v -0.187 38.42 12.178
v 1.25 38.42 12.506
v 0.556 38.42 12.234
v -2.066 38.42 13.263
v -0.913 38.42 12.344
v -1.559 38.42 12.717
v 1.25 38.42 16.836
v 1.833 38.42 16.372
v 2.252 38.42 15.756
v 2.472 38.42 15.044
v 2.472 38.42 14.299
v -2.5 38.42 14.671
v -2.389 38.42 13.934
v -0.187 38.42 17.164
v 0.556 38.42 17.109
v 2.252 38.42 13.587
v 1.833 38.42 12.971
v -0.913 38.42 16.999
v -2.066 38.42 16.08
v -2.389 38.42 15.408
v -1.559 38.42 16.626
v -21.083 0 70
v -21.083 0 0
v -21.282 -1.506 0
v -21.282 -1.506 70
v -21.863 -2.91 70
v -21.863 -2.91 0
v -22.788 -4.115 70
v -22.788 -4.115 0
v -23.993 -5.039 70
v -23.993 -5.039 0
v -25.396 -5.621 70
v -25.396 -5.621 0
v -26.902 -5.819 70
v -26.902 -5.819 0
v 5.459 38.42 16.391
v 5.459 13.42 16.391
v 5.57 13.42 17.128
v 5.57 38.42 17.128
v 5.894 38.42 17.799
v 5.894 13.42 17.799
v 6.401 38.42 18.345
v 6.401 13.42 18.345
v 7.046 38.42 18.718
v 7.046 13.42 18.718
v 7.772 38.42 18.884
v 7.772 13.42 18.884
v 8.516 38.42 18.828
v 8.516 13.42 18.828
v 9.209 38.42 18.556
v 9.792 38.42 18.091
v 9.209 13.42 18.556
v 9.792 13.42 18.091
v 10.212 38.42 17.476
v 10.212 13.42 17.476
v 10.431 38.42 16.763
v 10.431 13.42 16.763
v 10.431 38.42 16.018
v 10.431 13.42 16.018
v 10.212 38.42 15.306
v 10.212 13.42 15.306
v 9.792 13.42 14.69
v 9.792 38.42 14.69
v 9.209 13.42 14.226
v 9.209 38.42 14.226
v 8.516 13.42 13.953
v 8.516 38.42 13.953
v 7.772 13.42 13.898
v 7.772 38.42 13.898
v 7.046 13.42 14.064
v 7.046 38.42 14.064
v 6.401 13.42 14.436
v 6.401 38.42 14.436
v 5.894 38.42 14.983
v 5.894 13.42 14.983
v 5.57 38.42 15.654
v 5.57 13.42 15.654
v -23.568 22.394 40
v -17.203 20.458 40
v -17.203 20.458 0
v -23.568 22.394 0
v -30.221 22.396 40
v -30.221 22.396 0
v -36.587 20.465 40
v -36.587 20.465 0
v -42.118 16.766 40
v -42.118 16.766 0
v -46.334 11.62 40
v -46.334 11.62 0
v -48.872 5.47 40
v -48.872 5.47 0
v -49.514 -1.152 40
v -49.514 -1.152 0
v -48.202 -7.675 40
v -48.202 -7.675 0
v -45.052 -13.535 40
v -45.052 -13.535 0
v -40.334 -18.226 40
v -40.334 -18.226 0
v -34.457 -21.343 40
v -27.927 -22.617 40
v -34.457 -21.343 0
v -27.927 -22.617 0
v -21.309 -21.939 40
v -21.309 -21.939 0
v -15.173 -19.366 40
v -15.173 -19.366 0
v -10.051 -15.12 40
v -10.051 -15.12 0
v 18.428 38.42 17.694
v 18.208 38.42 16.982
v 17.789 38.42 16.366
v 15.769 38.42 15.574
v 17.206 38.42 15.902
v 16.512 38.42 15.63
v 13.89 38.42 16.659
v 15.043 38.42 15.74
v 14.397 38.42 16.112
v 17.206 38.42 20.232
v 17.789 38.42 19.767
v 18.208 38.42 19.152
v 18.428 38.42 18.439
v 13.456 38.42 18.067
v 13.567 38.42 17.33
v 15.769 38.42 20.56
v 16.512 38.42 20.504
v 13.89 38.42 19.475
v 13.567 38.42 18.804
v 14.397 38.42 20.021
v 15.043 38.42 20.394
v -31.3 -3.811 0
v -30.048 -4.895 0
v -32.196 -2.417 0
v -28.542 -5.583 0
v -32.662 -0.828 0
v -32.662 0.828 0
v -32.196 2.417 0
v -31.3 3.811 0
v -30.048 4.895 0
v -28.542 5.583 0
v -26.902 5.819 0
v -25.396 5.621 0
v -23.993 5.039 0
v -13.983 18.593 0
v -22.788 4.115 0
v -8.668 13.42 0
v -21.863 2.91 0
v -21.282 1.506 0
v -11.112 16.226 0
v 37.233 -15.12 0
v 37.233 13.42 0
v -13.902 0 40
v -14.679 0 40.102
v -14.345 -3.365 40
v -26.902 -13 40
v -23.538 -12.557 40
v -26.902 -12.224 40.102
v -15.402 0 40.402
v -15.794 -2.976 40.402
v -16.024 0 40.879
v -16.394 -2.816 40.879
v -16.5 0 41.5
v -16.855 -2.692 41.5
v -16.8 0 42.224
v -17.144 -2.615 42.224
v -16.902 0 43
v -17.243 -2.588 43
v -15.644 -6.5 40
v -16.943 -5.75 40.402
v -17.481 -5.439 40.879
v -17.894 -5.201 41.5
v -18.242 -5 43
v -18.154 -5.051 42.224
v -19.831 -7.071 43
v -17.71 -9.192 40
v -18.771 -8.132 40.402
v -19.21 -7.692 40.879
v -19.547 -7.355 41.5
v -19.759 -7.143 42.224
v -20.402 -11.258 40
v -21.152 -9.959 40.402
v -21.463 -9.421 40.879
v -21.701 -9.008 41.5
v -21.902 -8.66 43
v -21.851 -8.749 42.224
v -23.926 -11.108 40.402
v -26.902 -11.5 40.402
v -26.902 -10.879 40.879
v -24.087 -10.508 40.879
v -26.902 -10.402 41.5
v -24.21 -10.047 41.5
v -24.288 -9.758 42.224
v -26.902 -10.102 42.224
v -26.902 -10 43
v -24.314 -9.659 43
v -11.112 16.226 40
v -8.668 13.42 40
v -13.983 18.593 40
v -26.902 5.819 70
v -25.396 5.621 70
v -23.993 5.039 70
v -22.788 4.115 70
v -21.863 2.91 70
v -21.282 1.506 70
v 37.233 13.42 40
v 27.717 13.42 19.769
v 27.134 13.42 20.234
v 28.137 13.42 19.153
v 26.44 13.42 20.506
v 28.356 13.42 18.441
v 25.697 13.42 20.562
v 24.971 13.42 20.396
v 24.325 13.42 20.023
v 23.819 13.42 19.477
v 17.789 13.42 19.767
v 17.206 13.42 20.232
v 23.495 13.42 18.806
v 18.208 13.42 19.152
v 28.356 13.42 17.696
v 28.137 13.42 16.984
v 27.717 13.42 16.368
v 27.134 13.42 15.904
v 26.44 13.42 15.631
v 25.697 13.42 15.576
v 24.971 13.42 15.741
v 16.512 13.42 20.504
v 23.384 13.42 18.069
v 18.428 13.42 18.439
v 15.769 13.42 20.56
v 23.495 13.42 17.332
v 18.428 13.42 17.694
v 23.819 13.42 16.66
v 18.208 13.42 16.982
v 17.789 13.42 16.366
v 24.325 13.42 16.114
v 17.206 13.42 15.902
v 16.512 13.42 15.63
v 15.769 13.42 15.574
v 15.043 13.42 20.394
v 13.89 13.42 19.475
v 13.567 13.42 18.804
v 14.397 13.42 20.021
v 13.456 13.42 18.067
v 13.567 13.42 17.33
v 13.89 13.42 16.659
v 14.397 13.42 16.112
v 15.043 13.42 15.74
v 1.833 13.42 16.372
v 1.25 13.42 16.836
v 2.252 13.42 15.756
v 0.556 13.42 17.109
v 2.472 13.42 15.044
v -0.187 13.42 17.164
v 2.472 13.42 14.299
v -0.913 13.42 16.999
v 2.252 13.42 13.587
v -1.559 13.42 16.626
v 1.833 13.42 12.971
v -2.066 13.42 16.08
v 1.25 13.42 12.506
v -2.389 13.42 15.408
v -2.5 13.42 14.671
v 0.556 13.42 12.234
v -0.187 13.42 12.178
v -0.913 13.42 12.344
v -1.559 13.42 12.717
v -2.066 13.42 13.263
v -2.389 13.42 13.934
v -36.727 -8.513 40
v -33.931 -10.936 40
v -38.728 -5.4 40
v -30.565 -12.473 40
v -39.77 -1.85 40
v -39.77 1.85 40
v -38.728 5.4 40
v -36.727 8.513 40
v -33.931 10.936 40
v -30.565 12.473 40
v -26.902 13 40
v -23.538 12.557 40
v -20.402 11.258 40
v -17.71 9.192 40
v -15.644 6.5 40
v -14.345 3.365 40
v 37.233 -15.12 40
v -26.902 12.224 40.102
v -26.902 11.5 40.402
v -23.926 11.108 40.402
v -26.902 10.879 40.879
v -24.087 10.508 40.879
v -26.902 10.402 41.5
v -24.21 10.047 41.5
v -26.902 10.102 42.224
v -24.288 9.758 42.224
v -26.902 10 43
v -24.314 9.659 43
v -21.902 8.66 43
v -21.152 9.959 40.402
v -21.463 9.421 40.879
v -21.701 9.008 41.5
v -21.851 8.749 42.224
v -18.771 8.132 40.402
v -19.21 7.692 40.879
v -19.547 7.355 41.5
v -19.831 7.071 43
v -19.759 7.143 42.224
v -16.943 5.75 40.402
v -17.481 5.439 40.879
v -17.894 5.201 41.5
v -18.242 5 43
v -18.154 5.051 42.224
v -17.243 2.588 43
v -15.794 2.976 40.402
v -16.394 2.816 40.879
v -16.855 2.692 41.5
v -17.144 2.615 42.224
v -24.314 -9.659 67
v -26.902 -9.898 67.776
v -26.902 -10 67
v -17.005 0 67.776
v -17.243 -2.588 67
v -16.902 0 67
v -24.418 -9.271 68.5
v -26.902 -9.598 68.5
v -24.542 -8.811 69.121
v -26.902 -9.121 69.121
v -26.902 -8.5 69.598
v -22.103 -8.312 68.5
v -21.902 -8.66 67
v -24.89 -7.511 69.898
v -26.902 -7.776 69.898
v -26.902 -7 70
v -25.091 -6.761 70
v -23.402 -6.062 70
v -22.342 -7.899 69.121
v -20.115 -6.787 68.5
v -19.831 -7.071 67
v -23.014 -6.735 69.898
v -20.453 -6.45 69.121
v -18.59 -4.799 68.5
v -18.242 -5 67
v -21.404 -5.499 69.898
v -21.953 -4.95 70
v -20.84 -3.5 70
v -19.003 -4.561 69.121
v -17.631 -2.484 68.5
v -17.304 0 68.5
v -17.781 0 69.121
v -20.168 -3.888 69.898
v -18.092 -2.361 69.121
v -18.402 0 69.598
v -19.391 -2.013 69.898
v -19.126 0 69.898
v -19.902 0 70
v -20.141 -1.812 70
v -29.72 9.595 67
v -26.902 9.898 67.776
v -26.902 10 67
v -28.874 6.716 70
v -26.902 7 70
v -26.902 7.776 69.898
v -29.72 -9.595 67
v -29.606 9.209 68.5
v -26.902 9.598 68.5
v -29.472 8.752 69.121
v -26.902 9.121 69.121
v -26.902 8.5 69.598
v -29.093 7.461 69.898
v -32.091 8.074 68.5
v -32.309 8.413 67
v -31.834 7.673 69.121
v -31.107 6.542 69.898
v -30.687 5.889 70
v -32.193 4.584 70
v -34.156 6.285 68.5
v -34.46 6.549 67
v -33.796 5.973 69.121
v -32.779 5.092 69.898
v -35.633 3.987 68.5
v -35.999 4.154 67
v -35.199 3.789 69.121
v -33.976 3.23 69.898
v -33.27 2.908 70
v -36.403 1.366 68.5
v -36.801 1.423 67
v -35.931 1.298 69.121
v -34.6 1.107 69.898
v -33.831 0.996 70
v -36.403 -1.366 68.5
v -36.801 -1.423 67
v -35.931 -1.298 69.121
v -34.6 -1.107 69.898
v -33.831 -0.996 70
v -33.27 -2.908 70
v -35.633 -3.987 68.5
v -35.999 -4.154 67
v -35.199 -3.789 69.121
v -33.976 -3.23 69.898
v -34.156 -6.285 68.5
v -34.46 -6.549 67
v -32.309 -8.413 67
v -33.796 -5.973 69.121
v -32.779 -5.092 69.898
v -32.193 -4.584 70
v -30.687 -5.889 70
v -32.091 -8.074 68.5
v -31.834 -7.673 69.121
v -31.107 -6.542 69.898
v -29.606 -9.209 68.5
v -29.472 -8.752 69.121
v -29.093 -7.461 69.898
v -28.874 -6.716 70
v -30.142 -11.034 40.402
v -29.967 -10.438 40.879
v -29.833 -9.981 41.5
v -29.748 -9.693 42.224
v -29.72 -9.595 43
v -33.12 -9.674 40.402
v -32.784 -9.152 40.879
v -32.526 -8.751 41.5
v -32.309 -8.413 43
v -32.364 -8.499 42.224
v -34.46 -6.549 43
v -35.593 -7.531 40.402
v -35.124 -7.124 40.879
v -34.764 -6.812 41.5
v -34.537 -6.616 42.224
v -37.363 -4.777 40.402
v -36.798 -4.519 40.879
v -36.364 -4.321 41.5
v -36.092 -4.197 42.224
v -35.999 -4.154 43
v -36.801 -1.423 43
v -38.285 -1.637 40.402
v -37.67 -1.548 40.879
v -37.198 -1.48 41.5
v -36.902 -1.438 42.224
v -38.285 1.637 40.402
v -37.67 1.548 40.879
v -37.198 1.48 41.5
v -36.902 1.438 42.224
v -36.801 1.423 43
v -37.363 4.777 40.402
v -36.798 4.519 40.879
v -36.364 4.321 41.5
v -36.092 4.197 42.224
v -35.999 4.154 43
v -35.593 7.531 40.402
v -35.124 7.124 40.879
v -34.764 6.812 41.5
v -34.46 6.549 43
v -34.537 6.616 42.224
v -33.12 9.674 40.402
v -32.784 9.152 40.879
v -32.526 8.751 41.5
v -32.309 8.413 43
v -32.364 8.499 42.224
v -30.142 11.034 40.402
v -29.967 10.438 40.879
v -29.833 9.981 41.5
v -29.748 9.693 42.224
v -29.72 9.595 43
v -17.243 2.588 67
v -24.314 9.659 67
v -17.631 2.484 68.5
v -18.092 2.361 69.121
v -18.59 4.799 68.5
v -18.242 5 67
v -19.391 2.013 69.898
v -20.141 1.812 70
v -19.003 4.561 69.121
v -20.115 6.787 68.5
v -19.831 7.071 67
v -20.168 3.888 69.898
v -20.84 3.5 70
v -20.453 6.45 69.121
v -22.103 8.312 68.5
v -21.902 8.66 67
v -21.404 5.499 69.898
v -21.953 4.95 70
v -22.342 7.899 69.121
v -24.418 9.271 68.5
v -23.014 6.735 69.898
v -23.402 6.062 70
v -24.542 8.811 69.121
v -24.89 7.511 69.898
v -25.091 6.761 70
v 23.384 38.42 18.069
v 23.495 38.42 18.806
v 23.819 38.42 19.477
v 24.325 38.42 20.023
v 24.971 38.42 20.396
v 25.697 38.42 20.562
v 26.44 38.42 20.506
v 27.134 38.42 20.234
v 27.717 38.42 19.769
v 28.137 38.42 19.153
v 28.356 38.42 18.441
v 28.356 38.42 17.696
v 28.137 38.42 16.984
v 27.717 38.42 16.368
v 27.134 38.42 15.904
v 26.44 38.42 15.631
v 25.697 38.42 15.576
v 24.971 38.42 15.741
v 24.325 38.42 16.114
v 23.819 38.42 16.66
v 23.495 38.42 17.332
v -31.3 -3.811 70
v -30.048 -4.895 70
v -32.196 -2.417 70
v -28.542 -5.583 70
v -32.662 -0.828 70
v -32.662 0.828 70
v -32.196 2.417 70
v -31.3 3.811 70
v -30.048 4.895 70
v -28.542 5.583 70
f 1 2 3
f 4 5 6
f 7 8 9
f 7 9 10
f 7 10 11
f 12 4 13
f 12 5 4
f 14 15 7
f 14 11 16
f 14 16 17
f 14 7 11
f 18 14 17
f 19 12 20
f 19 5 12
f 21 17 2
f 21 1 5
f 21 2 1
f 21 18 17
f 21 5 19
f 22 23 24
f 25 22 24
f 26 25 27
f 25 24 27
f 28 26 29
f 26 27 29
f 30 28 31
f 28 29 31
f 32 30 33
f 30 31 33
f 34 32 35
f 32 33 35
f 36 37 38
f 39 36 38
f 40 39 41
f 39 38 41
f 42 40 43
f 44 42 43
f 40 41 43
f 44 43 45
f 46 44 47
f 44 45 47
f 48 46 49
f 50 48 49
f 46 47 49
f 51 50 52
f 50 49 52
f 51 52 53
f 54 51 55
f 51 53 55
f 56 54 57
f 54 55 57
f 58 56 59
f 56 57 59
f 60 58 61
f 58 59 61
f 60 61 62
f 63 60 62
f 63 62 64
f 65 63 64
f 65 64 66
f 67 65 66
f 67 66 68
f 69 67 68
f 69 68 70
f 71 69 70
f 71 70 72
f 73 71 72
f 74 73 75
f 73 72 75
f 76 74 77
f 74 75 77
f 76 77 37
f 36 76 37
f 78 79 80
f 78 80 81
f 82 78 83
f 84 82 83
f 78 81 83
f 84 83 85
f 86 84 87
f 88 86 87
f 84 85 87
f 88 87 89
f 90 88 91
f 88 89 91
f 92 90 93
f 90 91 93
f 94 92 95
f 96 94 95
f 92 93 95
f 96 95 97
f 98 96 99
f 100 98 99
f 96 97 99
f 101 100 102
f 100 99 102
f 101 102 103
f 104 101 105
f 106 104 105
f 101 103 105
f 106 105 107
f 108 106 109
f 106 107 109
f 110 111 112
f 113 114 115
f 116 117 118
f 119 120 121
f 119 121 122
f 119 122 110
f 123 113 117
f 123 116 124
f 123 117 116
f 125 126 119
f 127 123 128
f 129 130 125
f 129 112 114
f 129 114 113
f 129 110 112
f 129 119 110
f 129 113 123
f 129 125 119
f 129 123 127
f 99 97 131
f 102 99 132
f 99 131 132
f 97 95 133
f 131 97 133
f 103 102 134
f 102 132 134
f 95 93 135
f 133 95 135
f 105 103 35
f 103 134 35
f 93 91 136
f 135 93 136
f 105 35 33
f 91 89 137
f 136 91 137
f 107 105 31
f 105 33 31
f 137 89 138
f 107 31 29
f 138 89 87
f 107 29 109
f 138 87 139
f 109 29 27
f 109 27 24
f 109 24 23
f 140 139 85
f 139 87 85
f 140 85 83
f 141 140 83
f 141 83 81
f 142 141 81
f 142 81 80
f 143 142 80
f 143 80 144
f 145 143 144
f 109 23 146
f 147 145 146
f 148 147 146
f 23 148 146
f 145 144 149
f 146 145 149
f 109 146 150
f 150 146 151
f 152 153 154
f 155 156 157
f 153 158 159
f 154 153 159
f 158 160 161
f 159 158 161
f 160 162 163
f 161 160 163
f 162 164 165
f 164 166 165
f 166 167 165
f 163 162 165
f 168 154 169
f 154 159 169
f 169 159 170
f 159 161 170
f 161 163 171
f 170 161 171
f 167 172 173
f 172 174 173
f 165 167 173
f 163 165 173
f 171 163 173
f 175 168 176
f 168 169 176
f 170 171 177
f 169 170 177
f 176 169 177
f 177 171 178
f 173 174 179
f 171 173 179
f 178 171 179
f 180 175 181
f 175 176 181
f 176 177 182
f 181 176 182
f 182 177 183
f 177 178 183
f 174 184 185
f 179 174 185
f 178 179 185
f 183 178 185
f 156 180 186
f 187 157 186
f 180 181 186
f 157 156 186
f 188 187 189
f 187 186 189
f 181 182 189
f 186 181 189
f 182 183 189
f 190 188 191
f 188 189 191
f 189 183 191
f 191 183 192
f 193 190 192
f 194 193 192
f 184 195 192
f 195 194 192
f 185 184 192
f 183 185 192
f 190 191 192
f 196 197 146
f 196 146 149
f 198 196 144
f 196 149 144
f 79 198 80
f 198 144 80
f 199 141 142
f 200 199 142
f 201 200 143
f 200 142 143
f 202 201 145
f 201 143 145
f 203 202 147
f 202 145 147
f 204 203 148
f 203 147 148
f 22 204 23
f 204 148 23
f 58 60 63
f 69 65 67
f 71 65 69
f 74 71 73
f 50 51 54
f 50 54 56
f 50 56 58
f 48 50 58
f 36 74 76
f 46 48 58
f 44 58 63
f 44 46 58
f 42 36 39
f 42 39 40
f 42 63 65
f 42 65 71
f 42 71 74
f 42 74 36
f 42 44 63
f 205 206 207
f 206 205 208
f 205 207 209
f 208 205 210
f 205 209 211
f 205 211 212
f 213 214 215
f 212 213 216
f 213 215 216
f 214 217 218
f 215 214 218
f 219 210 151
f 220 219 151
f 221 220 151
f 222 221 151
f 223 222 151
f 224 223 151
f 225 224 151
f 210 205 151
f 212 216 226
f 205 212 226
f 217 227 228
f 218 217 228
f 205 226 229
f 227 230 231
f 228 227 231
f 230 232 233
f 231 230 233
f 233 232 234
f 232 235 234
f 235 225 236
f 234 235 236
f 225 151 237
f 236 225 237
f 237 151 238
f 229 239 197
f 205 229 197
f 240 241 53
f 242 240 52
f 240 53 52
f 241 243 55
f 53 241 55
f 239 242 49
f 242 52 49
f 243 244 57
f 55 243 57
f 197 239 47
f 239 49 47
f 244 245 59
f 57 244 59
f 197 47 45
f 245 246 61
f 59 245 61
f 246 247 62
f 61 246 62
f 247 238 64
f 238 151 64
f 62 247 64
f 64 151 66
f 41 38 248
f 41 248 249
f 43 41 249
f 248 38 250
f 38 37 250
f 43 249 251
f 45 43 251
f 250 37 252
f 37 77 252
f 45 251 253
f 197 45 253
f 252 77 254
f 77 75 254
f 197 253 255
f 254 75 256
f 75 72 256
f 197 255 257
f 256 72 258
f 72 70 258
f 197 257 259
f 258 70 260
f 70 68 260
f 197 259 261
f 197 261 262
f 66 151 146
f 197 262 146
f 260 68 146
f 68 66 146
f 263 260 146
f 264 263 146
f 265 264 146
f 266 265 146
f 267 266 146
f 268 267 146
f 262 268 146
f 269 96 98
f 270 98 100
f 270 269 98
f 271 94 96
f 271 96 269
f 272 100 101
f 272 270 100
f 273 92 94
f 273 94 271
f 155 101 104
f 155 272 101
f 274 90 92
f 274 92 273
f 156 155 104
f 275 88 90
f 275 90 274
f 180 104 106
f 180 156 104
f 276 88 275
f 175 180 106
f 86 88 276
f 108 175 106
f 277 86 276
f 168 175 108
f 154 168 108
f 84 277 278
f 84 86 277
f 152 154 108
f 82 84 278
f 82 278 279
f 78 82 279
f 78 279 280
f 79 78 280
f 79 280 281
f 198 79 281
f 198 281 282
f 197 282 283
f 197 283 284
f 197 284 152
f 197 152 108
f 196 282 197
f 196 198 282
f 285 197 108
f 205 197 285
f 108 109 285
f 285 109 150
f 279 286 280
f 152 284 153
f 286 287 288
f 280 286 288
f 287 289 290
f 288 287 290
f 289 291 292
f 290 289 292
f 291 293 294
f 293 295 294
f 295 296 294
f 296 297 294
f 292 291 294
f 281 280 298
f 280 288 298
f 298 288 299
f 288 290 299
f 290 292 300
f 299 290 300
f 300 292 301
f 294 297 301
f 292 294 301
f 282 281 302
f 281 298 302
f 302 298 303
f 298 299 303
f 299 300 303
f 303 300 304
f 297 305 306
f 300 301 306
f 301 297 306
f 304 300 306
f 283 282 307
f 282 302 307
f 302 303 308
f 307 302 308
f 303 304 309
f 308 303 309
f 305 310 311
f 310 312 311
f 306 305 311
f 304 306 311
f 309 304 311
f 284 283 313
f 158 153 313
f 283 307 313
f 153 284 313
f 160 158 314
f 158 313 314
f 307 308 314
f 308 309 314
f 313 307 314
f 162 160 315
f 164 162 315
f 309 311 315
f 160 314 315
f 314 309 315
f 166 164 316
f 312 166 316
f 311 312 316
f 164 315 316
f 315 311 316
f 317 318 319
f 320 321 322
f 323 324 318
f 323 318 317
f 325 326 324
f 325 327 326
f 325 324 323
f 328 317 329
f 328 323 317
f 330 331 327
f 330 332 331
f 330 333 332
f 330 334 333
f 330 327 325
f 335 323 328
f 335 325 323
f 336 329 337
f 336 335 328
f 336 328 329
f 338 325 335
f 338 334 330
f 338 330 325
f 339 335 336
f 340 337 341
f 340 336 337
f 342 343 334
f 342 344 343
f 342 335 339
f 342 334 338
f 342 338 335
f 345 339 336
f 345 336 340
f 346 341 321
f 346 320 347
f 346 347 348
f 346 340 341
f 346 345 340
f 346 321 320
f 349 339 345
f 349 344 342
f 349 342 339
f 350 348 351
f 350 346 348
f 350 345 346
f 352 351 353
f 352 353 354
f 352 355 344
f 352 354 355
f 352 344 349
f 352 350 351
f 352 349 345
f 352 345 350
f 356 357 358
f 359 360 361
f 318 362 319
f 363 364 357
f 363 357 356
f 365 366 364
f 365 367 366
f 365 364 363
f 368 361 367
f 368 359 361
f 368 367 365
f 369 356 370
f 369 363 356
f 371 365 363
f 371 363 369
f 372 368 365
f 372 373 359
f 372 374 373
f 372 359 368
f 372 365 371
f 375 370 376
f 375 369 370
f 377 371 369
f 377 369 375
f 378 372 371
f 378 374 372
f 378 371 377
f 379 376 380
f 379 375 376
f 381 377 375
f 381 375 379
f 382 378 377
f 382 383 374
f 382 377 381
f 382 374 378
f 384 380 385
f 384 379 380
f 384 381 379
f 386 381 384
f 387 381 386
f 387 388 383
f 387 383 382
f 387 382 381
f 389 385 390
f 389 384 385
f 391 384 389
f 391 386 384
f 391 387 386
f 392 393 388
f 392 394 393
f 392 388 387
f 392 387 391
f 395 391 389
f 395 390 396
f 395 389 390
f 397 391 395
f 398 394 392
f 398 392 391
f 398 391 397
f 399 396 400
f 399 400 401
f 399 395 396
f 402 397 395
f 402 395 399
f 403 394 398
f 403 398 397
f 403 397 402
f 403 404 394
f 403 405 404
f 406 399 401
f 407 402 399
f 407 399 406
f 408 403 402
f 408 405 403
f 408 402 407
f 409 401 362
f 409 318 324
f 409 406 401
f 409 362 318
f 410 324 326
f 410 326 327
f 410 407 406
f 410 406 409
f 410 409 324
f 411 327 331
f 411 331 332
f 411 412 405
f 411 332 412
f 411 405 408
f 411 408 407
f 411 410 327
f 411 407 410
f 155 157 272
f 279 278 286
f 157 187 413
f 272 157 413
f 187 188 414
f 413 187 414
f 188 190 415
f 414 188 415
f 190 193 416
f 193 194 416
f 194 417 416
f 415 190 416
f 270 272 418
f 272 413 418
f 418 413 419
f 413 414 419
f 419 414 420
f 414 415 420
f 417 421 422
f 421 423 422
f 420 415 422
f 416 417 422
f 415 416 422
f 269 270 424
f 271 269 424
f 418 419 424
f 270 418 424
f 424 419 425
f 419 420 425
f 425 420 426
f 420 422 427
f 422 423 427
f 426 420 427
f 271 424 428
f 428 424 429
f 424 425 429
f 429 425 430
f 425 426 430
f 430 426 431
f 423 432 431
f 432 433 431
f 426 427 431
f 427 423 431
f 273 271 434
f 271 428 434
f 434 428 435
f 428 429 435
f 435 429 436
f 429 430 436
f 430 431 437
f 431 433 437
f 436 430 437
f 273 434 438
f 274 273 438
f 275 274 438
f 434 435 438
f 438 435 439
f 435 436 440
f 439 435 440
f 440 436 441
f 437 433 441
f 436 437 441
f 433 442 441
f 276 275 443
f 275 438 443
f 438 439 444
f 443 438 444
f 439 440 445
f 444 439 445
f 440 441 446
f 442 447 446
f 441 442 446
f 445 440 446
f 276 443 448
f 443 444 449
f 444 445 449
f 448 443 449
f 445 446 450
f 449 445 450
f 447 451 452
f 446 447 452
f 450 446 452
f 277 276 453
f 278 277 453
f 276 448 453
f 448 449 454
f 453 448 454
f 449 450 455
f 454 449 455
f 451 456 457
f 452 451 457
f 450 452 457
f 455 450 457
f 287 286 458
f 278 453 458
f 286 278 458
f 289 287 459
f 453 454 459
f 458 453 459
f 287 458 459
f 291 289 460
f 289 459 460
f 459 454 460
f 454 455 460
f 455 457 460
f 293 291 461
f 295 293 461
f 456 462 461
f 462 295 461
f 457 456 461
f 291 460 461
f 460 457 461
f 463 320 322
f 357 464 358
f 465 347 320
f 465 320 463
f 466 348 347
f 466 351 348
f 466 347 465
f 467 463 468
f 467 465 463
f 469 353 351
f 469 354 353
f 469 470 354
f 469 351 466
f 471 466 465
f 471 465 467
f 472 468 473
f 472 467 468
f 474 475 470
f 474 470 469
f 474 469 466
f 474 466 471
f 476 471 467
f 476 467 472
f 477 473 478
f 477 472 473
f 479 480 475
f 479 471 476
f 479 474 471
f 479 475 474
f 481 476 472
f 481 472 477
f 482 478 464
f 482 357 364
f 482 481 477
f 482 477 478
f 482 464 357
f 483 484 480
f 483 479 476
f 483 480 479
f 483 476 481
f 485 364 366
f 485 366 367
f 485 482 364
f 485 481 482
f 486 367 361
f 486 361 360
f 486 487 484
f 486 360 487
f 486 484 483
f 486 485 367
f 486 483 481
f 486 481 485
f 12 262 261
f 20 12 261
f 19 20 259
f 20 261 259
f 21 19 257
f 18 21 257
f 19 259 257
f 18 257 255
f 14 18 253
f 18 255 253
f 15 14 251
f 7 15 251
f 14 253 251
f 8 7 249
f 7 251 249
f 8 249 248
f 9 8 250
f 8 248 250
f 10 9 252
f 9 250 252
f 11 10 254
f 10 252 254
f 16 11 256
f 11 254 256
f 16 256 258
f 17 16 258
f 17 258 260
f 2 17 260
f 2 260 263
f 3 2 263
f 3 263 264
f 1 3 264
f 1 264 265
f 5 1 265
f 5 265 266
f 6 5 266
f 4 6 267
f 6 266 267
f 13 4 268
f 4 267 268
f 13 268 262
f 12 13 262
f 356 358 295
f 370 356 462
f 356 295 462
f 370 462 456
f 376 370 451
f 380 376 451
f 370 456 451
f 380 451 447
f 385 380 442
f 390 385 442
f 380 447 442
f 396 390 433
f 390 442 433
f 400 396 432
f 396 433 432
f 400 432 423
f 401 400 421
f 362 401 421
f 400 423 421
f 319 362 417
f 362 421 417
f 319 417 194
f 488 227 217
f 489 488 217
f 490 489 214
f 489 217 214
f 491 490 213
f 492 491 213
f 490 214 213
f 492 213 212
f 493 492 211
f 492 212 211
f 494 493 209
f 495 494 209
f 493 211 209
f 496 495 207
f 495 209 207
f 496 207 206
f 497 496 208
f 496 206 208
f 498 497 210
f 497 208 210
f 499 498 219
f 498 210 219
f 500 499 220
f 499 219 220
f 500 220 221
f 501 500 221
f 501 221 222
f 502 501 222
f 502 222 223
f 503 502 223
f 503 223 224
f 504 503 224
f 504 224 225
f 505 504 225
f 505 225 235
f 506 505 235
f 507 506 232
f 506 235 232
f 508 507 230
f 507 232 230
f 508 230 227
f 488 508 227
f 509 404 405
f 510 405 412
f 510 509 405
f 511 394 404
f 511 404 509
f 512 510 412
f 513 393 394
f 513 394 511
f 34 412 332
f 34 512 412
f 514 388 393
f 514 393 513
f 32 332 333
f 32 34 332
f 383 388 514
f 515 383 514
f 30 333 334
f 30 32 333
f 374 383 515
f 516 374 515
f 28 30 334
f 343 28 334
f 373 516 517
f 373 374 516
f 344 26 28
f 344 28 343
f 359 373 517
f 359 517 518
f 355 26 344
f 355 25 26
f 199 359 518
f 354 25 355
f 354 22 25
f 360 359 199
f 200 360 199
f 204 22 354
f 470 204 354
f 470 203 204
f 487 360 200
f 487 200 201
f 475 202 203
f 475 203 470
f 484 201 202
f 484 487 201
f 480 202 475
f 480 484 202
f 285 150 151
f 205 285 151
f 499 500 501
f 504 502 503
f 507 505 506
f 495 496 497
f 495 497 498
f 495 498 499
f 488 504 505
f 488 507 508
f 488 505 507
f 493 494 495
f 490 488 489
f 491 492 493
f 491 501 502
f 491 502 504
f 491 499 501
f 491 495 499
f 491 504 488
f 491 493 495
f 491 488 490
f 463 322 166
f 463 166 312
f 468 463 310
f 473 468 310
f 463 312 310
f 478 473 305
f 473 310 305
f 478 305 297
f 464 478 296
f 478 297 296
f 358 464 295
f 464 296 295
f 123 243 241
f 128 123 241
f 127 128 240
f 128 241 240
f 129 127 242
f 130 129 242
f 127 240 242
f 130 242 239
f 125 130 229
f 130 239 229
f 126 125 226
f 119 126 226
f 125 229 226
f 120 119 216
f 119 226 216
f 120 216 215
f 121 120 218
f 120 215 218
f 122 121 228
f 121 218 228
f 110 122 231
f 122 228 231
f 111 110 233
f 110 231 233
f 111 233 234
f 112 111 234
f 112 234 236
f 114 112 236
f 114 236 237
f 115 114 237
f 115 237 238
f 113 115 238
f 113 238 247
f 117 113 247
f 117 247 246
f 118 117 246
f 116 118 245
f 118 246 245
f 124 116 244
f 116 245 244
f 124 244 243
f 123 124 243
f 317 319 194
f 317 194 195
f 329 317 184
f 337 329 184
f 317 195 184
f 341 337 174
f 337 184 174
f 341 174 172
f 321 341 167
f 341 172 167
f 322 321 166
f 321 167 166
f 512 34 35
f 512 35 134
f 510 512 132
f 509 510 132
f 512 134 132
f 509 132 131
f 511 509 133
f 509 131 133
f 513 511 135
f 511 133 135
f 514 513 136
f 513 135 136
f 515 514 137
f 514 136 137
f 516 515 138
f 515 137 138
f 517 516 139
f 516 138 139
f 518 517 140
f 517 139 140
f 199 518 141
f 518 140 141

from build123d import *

# Parameters (mm, degrees)
F1_DEPTH = 70
F2_DEPTH = 40
F3_R     = 3
F4_R     = 2.5
F5_DEPTH = 25


with BuildPart() as f1:
    # F0 (on Top) → F1 (new body)
    with BuildSketch(Plane.XY):
        with BuildLine():
            ThreePointArc((-16.9023339674, 0), (-19.8312661555, 7.0710678119), (-26.9023339674, 10))
            Line((-26.9023339674, 10), (-26.9023339674, 5.8191100826))
            ThreePointArc((-26.9023339674, 5.8191100826), (-22.7876017675, 4.1147321999), (-21.0832238848, 0))
            ThreePointArc((-21.0832238848, 0), (-22.7876017675, -4.1147321999), (-26.9023339674, -5.8191100826))
            Line((-26.9023339674, -5.8191100826), (-26.9023339674, -10))
            ThreePointArc((-26.9023339674, -10), (-19.8312661555, -7.0710678119), (-16.9023339674, 0))
        make_face()
        with BuildLine():
            Line((-26.9023339674, 5.8191100826), (-26.9023339674, 10))
            ThreePointArc((-26.9023339674, 10), (-36.9023339674, 0), (-26.9023339674, -10))
            Line((-26.9023339674, -10), (-26.9023339674, -5.8191100826))
            ThreePointArc((-26.9023339674, -5.8191100826), (-32.7214440499, 0), (-26.9023339674, 5.8191100826))
        make_face()
    extrude(amount=F1_DEPTH)

    # F0 (on Top) → F2 (join)
    with BuildSketch(Plane.XY):
        with BuildLine():
            Line((37.2332856059, 13.4202644998), (21.7927563936, 13.4202644998))
            Line((21.7927563936, 13.4202644998), (-8.6679077107, 13.4202644998))
            ThreePointArc((-8.6679077107, 13.4202644998), (-5.391446413, 7.0625432229), (-4.261711181, 0))
            ThreePointArc((-4.261711181, 0), (-5.7584541043, -8.0953162068), (-10.0507873126, -15.1202901922))
            Line((-10.0507873126, -15.1202901922), (37.2332856059, -15.1202901922))
            Line((37.2332856059, -15.1202901922), (37.2332856059, 13.4202644998))
        make_face()
        with BuildLine():
            ThreePointArc((-4.261711181, 0), (-5.391446413, 7.0625432229), (-8.6679077107, 13.4202644998))
            Line((-8.6679077107, 13.4202644998), (-26.9023339674, 13.4202644998))
            Line((-26.9023339674, 13.4202644998), (-26.9023339674, 10))
            ThreePointArc((-26.9023339674, 10), (-19.8312661555, 7.0710678119), (-16.9023339674, 0))
            ThreePointArc((-16.9023339674, 0), (-19.8312661555, -7.0710678119), (-26.9023339674, -10))
            Line((-26.9023339674, -10), (-26.9023339674, -15.1202901922))
            Line((-26.9023339674, -15.1202901922), (-10.0507873126, -15.1202901922))
            ThreePointArc((-10.0507873126, -15.1202901922), (-5.7584541043, -8.0953162068), (-4.261711181, 0))
        make_face()
        with BuildLine():
            Line((-26.9023339674, 13.4202644998), (-8.6679077107, 13.4202644998))
            ThreePointArc((-8.6679077107, 13.4202644998), (-12.4988940391, 17.468220241), (-17.2027000327, 20.4576367571))
            ThreePointArc((-17.2027000327, 20.4576367571), (-49.0989219749, -4.4619817321), (-10.0507873126, -15.1202901922))
            Line((-10.0507873126, -15.1202901922), (-26.9023339674, -15.1202901922))
            Line((-26.9023339674, -15.1202901922), (-26.9023339674, -10))
            ThreePointArc((-26.9023339674, -10), (-36.9023339674, 0), (-26.9023339674, 10))
            Line((-26.9023339674, 10), (-26.9023339674, 13.4202644998))
        make_face()
    extrude(amount=F2_DEPTH)

    # F3
    f3_edges = [f1.edges().sort_by_distance(p)[0] for p in [
        (-36.902334, 0, 40),
        (-16.902334, 0, 55),
        (-36.902334, 0, 70),
    ]]
    fillet(f3_edges, radius=F3_R)

    # F4 (on face) → F5 (join)
    with BuildSketch(Plane(origin=(0, 13.4202644998, 0), x_dir=(-1, 0, 0), z_dir=(0, 1, 0))):
        with Locations((-25.8841626346, 18.0686339736)):
            Circle(F4_R)
        with Locations((-15.9560106695, 18.0668439716)):
            Circle(F4_R)
        with Locations((-7.9592689872, 16.3908023387)):
            Circle(F4_R)
        with Locations((0, 14.6713265902)):
            Circle(F4_R)
    extrude(amount=F5_DEPTH)


solid = f1.part
